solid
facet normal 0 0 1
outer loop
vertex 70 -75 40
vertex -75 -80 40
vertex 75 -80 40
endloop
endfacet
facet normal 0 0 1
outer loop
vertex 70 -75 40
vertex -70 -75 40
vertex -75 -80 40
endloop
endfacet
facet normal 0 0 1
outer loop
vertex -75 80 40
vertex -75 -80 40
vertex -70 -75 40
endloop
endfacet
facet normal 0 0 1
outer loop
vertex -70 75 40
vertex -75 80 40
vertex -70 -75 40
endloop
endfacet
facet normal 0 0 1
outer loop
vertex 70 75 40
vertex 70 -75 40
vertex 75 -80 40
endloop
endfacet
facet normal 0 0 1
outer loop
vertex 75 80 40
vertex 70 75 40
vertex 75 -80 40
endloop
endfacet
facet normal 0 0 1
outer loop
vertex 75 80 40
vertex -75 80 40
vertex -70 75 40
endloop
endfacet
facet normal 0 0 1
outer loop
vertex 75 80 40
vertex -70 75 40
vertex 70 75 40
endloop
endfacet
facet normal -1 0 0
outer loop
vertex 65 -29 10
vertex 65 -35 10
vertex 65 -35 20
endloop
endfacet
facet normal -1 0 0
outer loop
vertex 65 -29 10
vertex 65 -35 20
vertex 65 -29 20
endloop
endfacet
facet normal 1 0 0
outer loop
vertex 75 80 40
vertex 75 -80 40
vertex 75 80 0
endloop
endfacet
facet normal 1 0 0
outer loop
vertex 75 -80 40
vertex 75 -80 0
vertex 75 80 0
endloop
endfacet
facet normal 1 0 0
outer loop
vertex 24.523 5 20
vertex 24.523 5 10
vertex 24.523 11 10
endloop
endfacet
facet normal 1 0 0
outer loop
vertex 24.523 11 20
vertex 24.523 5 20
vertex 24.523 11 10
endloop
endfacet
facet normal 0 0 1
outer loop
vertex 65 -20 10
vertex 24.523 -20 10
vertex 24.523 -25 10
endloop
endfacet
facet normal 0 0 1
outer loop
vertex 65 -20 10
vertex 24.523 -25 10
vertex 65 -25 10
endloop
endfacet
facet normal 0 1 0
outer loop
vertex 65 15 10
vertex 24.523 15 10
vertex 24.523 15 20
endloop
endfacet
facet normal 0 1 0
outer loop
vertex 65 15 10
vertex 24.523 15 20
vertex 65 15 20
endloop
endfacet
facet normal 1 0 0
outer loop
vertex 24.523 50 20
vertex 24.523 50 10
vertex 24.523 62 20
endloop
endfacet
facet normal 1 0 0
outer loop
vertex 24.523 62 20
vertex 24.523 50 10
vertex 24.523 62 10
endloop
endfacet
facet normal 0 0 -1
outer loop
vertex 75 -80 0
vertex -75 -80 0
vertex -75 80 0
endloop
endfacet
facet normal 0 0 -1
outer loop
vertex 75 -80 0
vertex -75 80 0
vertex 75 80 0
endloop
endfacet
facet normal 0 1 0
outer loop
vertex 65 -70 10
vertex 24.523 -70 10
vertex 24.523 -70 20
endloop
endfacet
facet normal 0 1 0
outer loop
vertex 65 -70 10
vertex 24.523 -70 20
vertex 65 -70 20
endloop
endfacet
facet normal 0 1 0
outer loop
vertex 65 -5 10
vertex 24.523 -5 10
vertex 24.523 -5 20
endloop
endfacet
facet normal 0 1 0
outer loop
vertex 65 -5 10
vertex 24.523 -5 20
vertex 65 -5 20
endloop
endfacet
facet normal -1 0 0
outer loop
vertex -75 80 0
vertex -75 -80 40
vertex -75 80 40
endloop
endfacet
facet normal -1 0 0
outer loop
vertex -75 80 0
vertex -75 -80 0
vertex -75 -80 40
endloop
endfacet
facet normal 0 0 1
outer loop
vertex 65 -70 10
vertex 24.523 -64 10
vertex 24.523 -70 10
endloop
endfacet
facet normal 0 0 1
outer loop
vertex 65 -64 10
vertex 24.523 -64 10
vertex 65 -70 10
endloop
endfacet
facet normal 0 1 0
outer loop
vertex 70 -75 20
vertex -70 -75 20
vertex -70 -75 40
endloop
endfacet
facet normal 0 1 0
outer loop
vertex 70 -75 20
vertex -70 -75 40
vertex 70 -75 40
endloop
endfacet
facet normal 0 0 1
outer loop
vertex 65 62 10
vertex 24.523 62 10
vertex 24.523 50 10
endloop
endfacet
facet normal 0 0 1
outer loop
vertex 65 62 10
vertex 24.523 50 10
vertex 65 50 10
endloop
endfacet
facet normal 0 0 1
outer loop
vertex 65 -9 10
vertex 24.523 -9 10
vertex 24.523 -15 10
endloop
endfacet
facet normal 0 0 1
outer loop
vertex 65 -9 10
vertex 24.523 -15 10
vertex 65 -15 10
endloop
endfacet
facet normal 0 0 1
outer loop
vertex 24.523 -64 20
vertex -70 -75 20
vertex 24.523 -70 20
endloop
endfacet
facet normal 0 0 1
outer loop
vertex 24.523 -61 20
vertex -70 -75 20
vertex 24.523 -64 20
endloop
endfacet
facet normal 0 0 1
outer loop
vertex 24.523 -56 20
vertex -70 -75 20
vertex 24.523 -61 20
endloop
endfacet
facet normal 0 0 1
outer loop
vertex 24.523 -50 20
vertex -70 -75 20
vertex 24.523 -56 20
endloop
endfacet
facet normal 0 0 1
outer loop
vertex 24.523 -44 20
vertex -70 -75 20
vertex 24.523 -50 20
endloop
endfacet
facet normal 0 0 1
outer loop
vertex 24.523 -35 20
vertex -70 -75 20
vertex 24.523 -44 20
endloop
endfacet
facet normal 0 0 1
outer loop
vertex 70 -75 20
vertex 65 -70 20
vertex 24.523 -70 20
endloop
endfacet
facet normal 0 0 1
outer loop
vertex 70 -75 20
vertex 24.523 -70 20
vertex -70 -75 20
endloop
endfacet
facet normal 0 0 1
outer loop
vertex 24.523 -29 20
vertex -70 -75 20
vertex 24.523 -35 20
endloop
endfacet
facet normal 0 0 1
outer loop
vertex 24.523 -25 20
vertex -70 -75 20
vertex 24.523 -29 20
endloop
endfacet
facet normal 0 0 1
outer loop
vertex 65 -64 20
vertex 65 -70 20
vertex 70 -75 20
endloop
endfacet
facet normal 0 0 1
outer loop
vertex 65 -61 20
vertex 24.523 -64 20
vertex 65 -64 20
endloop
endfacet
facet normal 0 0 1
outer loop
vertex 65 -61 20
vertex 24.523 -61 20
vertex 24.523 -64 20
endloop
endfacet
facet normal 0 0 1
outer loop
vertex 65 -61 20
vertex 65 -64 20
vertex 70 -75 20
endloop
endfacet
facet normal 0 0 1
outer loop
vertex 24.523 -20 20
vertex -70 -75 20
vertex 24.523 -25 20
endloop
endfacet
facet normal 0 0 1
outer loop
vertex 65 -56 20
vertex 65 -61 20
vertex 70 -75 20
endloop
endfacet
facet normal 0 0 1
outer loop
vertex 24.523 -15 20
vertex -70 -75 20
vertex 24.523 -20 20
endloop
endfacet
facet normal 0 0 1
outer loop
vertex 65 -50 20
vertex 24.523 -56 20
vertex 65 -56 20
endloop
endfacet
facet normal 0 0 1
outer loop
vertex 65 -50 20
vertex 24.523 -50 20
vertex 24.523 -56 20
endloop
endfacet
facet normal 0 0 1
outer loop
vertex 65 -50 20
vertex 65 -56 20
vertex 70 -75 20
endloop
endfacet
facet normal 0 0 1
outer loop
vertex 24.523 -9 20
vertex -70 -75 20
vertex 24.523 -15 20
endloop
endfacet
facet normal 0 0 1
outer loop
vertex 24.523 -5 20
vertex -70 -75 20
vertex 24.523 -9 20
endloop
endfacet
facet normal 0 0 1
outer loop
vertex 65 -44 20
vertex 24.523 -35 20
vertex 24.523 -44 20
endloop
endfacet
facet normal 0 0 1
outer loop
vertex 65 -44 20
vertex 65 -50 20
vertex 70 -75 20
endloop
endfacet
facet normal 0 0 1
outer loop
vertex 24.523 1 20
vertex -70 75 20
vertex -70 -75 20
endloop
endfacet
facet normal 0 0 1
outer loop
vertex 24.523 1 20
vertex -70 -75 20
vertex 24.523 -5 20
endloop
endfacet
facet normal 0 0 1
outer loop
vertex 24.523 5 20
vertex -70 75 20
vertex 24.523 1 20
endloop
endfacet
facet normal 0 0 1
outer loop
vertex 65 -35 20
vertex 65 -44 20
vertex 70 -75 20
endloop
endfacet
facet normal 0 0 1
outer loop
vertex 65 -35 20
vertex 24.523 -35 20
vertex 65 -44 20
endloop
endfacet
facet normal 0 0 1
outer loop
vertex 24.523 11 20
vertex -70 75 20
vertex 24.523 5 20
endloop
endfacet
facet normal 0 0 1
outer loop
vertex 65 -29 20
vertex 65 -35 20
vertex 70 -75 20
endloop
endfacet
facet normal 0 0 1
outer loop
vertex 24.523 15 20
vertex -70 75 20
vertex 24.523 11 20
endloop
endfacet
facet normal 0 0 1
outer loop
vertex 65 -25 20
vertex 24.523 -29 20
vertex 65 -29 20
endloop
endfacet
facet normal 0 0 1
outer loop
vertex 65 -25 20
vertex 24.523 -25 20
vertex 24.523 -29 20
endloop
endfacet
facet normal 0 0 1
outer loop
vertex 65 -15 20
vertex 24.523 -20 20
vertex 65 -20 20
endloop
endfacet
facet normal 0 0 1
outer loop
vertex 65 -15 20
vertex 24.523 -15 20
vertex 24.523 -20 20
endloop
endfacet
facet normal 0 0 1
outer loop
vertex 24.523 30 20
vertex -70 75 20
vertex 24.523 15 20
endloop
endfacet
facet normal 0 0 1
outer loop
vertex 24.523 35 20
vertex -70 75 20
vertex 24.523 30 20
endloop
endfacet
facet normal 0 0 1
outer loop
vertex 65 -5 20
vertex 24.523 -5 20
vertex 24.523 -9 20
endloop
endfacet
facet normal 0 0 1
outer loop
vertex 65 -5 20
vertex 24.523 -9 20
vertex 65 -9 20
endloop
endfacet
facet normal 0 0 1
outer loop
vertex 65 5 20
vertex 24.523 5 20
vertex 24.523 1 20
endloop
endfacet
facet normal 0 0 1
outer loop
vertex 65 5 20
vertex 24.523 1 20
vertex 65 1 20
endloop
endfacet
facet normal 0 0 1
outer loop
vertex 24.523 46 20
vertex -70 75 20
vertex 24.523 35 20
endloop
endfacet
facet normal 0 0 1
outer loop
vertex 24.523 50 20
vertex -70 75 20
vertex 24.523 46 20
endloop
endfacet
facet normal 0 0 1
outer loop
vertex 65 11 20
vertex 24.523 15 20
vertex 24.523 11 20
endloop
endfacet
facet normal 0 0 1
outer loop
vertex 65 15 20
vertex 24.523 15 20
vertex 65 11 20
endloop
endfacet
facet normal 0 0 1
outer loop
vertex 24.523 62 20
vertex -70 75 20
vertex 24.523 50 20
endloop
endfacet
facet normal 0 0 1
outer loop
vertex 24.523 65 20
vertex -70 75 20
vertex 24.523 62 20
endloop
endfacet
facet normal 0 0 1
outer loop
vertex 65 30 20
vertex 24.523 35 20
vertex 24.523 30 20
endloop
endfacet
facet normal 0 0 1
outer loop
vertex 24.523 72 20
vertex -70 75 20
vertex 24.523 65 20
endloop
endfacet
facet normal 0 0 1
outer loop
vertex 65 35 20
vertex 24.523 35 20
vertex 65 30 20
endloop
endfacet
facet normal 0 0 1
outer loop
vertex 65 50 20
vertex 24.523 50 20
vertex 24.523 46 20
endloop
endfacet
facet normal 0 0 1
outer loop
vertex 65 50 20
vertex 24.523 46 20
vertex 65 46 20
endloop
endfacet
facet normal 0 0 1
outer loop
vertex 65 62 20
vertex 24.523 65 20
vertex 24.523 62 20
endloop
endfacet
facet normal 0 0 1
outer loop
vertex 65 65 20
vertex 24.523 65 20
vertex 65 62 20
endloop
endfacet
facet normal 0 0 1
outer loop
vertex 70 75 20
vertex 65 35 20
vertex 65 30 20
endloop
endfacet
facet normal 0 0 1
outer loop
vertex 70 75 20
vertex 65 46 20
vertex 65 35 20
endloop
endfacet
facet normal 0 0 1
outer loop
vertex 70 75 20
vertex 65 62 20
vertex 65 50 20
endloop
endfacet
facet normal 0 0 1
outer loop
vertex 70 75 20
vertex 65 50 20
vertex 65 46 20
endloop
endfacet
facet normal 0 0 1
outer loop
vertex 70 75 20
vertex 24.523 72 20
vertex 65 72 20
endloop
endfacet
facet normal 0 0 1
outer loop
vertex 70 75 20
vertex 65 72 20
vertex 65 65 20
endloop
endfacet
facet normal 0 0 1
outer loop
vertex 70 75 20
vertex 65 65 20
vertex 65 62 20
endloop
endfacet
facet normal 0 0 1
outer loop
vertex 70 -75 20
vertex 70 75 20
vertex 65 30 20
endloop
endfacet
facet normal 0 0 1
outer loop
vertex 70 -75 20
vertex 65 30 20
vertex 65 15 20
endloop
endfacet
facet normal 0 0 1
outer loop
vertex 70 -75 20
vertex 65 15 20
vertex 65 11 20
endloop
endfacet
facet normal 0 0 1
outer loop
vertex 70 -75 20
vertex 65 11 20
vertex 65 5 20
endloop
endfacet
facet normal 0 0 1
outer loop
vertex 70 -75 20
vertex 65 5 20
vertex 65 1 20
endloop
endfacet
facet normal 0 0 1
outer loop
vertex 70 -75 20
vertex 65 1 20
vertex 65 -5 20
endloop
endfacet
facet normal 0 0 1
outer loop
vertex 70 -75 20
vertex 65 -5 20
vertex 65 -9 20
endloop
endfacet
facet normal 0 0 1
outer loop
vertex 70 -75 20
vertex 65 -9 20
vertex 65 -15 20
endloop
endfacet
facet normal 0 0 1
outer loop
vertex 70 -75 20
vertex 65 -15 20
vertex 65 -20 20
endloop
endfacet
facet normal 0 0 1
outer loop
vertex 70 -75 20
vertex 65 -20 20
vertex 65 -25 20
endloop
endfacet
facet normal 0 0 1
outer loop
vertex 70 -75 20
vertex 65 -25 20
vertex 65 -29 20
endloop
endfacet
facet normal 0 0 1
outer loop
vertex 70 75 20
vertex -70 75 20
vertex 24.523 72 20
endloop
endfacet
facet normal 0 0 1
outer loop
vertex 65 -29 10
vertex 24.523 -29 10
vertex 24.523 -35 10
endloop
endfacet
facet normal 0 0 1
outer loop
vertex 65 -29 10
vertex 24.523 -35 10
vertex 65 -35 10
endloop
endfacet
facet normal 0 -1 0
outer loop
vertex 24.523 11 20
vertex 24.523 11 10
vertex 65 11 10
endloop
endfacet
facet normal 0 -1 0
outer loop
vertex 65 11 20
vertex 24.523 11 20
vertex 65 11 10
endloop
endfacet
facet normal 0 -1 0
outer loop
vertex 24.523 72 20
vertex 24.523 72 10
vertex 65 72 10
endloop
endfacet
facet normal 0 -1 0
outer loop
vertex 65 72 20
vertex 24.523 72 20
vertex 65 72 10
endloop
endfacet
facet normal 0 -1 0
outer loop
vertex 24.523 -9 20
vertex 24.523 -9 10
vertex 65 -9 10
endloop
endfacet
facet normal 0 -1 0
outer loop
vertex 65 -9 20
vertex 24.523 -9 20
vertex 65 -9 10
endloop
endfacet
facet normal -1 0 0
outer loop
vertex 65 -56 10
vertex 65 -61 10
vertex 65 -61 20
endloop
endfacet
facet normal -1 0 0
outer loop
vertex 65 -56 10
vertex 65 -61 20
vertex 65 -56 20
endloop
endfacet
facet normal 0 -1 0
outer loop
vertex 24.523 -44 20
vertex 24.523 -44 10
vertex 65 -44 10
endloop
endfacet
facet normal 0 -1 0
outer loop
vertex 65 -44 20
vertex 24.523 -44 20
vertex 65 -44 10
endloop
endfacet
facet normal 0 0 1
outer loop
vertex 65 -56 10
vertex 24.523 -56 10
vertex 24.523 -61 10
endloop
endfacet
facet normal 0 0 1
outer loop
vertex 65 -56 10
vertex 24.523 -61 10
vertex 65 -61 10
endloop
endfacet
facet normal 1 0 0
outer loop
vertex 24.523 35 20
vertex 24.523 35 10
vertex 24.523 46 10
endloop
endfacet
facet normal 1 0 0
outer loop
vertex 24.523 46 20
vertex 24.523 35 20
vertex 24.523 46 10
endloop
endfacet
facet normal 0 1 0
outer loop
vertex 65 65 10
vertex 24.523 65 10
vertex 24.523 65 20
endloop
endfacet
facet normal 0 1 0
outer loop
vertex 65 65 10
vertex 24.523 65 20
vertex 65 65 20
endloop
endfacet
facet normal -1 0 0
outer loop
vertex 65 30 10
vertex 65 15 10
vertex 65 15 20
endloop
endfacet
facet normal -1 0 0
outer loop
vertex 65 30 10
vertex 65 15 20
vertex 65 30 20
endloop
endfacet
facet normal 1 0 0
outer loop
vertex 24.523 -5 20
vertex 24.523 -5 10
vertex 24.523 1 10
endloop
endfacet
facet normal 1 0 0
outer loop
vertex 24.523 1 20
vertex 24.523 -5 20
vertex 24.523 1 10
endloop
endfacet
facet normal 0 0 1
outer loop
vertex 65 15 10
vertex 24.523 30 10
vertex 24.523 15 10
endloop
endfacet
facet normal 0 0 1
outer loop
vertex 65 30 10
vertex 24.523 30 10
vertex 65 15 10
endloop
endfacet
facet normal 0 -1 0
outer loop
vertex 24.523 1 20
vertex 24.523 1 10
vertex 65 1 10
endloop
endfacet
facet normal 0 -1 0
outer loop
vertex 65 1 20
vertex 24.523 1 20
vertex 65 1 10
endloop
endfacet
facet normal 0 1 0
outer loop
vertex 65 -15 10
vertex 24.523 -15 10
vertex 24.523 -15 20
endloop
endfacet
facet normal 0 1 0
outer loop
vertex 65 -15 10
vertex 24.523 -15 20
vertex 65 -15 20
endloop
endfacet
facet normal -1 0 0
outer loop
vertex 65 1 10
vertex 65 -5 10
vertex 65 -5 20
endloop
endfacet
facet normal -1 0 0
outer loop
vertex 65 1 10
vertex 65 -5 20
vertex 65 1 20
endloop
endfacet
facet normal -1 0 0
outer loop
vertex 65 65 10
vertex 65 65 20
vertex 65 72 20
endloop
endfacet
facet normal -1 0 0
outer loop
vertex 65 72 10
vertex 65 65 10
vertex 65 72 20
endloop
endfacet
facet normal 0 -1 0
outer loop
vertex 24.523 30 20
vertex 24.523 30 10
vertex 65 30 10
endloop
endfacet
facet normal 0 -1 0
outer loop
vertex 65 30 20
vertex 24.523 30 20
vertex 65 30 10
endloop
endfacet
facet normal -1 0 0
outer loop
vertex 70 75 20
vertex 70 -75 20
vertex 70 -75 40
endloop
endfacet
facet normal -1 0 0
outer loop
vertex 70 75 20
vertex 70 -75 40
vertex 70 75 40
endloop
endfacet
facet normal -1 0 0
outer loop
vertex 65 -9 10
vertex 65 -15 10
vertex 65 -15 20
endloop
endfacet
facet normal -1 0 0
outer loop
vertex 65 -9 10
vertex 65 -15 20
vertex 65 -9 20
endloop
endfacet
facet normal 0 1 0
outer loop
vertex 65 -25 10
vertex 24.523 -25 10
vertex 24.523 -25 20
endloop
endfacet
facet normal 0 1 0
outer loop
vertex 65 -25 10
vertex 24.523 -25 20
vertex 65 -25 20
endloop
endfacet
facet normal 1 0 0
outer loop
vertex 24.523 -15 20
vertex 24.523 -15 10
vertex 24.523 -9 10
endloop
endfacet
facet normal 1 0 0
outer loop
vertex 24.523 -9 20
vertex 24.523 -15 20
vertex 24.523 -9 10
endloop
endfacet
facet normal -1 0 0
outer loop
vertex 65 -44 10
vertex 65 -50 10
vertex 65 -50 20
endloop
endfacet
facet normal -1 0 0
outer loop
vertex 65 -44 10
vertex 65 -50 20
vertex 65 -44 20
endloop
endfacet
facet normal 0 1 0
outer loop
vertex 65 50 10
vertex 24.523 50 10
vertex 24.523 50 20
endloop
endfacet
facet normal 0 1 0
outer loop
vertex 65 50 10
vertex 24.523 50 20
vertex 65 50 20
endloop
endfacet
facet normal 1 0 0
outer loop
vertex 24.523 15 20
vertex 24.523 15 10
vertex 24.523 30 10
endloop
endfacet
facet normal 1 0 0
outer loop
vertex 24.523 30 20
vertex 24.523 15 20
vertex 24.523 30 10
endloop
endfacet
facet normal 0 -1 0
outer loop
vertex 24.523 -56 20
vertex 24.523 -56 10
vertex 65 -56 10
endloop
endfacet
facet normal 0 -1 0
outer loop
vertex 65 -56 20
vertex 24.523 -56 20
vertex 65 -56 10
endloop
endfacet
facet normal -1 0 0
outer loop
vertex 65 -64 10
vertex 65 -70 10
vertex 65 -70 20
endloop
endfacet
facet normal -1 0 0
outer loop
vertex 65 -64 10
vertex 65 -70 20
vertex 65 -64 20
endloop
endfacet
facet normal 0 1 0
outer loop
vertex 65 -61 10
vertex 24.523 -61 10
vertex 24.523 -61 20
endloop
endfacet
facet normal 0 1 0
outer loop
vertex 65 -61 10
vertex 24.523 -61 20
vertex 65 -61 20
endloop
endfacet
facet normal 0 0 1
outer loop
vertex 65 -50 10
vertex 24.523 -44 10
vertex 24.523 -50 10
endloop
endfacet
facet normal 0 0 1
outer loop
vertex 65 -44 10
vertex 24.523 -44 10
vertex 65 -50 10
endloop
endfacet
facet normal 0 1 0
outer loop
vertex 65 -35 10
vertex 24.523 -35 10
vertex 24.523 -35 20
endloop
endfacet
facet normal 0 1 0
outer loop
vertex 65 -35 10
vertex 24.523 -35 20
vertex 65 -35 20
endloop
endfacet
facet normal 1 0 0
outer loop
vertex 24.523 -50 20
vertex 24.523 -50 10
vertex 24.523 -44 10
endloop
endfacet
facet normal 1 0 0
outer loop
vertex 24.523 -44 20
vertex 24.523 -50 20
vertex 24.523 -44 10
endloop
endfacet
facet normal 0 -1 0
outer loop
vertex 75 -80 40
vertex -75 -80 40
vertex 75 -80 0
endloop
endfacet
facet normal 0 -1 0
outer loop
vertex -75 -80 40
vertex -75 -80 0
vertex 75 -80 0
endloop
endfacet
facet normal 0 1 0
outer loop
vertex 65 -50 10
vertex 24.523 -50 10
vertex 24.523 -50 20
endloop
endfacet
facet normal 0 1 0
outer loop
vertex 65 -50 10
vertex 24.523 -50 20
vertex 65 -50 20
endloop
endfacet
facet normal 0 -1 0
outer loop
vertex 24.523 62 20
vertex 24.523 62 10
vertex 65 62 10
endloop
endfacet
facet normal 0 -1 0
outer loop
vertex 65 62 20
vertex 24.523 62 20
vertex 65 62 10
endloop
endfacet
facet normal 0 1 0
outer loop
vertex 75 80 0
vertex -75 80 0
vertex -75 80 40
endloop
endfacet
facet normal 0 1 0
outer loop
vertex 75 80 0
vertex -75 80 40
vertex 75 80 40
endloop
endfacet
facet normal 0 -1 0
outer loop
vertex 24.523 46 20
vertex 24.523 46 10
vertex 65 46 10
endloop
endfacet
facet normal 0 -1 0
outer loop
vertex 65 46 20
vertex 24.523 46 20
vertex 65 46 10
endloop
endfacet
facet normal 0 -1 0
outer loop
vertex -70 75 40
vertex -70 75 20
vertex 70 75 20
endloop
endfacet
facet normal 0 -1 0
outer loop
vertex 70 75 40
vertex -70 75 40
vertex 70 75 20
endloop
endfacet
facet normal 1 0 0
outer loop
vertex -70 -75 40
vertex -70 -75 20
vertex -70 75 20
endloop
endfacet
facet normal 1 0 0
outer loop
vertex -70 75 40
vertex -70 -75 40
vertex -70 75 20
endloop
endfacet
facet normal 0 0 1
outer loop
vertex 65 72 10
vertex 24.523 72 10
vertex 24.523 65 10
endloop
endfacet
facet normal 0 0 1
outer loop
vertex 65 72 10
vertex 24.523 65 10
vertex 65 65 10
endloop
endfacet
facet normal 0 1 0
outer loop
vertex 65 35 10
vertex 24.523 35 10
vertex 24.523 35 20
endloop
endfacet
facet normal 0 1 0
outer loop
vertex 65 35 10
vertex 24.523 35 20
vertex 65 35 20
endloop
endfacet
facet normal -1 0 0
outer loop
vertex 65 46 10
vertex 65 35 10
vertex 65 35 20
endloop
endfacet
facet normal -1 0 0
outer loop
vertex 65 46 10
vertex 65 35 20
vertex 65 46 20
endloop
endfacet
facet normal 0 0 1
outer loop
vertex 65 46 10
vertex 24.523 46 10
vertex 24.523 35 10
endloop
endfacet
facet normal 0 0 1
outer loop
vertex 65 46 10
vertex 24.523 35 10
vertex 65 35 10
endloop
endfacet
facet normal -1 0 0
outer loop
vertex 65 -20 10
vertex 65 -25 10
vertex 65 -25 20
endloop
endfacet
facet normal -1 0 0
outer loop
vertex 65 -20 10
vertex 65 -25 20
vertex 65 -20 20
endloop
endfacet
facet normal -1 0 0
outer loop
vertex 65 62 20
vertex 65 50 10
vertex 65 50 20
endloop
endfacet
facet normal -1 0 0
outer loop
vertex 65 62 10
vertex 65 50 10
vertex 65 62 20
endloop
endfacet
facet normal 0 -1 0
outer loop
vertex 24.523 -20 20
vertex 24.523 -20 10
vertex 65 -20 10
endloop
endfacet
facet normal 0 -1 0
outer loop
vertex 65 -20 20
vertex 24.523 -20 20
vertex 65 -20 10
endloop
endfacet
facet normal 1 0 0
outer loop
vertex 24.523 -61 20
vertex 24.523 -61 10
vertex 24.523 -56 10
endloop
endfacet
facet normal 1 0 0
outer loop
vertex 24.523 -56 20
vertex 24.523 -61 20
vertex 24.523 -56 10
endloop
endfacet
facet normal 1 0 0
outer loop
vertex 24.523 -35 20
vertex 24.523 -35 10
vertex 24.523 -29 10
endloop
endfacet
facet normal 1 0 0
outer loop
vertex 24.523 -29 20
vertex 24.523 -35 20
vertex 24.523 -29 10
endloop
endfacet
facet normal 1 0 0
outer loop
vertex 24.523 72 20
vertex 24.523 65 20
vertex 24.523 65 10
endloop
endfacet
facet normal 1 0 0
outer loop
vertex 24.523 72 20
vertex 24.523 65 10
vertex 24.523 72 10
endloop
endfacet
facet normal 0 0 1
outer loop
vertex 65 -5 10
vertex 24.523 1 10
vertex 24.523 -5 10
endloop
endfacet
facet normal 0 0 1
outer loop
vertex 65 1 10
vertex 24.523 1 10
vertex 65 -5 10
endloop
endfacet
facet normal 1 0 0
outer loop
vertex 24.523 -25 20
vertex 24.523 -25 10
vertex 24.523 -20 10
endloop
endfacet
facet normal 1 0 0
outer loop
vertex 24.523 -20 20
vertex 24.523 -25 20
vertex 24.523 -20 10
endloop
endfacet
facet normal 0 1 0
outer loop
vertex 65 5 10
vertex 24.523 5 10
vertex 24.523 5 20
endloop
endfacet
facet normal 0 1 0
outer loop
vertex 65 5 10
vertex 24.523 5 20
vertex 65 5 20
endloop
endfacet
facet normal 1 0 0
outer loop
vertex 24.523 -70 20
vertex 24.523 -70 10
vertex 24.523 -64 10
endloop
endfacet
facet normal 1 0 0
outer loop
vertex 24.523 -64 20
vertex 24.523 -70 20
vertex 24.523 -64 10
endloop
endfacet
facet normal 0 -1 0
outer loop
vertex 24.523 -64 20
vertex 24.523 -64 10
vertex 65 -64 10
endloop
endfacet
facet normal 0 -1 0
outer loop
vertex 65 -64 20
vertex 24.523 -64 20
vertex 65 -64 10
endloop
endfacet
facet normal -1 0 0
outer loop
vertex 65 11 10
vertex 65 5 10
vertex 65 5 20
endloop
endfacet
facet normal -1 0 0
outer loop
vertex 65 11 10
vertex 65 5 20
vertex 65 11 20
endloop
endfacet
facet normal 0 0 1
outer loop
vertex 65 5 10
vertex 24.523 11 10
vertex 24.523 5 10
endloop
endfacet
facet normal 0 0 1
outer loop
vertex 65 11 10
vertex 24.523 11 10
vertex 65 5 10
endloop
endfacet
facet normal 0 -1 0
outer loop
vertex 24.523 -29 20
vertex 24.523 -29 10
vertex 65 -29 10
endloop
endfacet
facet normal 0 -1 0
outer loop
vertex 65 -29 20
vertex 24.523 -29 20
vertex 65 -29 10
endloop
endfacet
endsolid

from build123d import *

# Parameters (mm, degrees)
F0_W     = 150
F0_H     = 160
F1_DEPTH = 10
F2_W     = 150
F2_H     = 160
F2_W_2   = 140
F2_H_2   = 150
F3_DEPTH = 30
F4_W     = 140
F4_H     = 150
F4_W_2   = 40.476516
F4_H_2   = 6
F4_H_3   = 5
F4_H_4   = 15
F4_H_5   = 11
F4_H_6   = 12
F4_H_7   = 7
F5_DEPTH = 10


with BuildPart() as f1:
    # F0 (on Top) → F1 (new body)
    with BuildSketch(Plane.XY):
        Rectangle(F0_W, F0_H)
    extrude(amount=F1_DEPTH)

    # F2 (on face) → F3 (join)
    with BuildSketch(Plane.XY.offset(10)):
        Rectangle(F2_W, F2_H)
        Rectangle(F2_W_2, F2_H_2, mode=Mode.SUBTRACT)
    extrude(amount=F3_DEPTH)

    # F4 (on face) → F5 (join)
    with BuildSketch(Plane.XY.offset(10)):
        Rectangle(F4_W, F4_H)
        with Locations((44.761742, -67)):
            Rectangle(F4_W_2, F4_H_2, mode=Mode.SUBTRACT)
        with Locations((44.761742, -58.5)):
            Rectangle(F4_W_2, F4_H_3, mode=Mode.SUBTRACT)
        with Locations((44.761742, -47)):
            Rectangle(F4_W_2, F4_H_2, mode=Mode.SUBTRACT)
        with Locations((44.761742, -32)):
            Rectangle(F4_W_2, F4_H_2, mode=Mode.SUBTRACT)
        with Locations((44.761742, -22.5)):
            Rectangle(F4_W_2, F4_H_3, mode=Mode.SUBTRACT)
        with Locations((44.761742, -12)):
            Rectangle(F4_W_2, F4_H_2, mode=Mode.SUBTRACT)
        with Locations((44.761742, -2)):
            Rectangle(F4_W_2, F4_H_2, mode=Mode.SUBTRACT)
        with Locations((44.761742, 8)):
            Rectangle(F4_W_2, F4_H_2, mode=Mode.SUBTRACT)
        with Locations((44.761742, 22.5)):
            Rectangle(F4_W_2, F4_H_4, mode=Mode.SUBTRACT)
        with Locations((44.761742, 40.5)):
            Rectangle(F4_W_2, F4_H_5, mode=Mode.SUBTRACT)
        with Locations((44.761742, 56)):
            Rectangle(F4_W_2, F4_H_6, mode=Mode.SUBTRACT)
        with Locations((44.761742, 68.5)):
            Rectangle(F4_W_2, F4_H_7, mode=Mode.SUBTRACT)
    extrude(amount=F5_DEPTH)


solid = f1.part
